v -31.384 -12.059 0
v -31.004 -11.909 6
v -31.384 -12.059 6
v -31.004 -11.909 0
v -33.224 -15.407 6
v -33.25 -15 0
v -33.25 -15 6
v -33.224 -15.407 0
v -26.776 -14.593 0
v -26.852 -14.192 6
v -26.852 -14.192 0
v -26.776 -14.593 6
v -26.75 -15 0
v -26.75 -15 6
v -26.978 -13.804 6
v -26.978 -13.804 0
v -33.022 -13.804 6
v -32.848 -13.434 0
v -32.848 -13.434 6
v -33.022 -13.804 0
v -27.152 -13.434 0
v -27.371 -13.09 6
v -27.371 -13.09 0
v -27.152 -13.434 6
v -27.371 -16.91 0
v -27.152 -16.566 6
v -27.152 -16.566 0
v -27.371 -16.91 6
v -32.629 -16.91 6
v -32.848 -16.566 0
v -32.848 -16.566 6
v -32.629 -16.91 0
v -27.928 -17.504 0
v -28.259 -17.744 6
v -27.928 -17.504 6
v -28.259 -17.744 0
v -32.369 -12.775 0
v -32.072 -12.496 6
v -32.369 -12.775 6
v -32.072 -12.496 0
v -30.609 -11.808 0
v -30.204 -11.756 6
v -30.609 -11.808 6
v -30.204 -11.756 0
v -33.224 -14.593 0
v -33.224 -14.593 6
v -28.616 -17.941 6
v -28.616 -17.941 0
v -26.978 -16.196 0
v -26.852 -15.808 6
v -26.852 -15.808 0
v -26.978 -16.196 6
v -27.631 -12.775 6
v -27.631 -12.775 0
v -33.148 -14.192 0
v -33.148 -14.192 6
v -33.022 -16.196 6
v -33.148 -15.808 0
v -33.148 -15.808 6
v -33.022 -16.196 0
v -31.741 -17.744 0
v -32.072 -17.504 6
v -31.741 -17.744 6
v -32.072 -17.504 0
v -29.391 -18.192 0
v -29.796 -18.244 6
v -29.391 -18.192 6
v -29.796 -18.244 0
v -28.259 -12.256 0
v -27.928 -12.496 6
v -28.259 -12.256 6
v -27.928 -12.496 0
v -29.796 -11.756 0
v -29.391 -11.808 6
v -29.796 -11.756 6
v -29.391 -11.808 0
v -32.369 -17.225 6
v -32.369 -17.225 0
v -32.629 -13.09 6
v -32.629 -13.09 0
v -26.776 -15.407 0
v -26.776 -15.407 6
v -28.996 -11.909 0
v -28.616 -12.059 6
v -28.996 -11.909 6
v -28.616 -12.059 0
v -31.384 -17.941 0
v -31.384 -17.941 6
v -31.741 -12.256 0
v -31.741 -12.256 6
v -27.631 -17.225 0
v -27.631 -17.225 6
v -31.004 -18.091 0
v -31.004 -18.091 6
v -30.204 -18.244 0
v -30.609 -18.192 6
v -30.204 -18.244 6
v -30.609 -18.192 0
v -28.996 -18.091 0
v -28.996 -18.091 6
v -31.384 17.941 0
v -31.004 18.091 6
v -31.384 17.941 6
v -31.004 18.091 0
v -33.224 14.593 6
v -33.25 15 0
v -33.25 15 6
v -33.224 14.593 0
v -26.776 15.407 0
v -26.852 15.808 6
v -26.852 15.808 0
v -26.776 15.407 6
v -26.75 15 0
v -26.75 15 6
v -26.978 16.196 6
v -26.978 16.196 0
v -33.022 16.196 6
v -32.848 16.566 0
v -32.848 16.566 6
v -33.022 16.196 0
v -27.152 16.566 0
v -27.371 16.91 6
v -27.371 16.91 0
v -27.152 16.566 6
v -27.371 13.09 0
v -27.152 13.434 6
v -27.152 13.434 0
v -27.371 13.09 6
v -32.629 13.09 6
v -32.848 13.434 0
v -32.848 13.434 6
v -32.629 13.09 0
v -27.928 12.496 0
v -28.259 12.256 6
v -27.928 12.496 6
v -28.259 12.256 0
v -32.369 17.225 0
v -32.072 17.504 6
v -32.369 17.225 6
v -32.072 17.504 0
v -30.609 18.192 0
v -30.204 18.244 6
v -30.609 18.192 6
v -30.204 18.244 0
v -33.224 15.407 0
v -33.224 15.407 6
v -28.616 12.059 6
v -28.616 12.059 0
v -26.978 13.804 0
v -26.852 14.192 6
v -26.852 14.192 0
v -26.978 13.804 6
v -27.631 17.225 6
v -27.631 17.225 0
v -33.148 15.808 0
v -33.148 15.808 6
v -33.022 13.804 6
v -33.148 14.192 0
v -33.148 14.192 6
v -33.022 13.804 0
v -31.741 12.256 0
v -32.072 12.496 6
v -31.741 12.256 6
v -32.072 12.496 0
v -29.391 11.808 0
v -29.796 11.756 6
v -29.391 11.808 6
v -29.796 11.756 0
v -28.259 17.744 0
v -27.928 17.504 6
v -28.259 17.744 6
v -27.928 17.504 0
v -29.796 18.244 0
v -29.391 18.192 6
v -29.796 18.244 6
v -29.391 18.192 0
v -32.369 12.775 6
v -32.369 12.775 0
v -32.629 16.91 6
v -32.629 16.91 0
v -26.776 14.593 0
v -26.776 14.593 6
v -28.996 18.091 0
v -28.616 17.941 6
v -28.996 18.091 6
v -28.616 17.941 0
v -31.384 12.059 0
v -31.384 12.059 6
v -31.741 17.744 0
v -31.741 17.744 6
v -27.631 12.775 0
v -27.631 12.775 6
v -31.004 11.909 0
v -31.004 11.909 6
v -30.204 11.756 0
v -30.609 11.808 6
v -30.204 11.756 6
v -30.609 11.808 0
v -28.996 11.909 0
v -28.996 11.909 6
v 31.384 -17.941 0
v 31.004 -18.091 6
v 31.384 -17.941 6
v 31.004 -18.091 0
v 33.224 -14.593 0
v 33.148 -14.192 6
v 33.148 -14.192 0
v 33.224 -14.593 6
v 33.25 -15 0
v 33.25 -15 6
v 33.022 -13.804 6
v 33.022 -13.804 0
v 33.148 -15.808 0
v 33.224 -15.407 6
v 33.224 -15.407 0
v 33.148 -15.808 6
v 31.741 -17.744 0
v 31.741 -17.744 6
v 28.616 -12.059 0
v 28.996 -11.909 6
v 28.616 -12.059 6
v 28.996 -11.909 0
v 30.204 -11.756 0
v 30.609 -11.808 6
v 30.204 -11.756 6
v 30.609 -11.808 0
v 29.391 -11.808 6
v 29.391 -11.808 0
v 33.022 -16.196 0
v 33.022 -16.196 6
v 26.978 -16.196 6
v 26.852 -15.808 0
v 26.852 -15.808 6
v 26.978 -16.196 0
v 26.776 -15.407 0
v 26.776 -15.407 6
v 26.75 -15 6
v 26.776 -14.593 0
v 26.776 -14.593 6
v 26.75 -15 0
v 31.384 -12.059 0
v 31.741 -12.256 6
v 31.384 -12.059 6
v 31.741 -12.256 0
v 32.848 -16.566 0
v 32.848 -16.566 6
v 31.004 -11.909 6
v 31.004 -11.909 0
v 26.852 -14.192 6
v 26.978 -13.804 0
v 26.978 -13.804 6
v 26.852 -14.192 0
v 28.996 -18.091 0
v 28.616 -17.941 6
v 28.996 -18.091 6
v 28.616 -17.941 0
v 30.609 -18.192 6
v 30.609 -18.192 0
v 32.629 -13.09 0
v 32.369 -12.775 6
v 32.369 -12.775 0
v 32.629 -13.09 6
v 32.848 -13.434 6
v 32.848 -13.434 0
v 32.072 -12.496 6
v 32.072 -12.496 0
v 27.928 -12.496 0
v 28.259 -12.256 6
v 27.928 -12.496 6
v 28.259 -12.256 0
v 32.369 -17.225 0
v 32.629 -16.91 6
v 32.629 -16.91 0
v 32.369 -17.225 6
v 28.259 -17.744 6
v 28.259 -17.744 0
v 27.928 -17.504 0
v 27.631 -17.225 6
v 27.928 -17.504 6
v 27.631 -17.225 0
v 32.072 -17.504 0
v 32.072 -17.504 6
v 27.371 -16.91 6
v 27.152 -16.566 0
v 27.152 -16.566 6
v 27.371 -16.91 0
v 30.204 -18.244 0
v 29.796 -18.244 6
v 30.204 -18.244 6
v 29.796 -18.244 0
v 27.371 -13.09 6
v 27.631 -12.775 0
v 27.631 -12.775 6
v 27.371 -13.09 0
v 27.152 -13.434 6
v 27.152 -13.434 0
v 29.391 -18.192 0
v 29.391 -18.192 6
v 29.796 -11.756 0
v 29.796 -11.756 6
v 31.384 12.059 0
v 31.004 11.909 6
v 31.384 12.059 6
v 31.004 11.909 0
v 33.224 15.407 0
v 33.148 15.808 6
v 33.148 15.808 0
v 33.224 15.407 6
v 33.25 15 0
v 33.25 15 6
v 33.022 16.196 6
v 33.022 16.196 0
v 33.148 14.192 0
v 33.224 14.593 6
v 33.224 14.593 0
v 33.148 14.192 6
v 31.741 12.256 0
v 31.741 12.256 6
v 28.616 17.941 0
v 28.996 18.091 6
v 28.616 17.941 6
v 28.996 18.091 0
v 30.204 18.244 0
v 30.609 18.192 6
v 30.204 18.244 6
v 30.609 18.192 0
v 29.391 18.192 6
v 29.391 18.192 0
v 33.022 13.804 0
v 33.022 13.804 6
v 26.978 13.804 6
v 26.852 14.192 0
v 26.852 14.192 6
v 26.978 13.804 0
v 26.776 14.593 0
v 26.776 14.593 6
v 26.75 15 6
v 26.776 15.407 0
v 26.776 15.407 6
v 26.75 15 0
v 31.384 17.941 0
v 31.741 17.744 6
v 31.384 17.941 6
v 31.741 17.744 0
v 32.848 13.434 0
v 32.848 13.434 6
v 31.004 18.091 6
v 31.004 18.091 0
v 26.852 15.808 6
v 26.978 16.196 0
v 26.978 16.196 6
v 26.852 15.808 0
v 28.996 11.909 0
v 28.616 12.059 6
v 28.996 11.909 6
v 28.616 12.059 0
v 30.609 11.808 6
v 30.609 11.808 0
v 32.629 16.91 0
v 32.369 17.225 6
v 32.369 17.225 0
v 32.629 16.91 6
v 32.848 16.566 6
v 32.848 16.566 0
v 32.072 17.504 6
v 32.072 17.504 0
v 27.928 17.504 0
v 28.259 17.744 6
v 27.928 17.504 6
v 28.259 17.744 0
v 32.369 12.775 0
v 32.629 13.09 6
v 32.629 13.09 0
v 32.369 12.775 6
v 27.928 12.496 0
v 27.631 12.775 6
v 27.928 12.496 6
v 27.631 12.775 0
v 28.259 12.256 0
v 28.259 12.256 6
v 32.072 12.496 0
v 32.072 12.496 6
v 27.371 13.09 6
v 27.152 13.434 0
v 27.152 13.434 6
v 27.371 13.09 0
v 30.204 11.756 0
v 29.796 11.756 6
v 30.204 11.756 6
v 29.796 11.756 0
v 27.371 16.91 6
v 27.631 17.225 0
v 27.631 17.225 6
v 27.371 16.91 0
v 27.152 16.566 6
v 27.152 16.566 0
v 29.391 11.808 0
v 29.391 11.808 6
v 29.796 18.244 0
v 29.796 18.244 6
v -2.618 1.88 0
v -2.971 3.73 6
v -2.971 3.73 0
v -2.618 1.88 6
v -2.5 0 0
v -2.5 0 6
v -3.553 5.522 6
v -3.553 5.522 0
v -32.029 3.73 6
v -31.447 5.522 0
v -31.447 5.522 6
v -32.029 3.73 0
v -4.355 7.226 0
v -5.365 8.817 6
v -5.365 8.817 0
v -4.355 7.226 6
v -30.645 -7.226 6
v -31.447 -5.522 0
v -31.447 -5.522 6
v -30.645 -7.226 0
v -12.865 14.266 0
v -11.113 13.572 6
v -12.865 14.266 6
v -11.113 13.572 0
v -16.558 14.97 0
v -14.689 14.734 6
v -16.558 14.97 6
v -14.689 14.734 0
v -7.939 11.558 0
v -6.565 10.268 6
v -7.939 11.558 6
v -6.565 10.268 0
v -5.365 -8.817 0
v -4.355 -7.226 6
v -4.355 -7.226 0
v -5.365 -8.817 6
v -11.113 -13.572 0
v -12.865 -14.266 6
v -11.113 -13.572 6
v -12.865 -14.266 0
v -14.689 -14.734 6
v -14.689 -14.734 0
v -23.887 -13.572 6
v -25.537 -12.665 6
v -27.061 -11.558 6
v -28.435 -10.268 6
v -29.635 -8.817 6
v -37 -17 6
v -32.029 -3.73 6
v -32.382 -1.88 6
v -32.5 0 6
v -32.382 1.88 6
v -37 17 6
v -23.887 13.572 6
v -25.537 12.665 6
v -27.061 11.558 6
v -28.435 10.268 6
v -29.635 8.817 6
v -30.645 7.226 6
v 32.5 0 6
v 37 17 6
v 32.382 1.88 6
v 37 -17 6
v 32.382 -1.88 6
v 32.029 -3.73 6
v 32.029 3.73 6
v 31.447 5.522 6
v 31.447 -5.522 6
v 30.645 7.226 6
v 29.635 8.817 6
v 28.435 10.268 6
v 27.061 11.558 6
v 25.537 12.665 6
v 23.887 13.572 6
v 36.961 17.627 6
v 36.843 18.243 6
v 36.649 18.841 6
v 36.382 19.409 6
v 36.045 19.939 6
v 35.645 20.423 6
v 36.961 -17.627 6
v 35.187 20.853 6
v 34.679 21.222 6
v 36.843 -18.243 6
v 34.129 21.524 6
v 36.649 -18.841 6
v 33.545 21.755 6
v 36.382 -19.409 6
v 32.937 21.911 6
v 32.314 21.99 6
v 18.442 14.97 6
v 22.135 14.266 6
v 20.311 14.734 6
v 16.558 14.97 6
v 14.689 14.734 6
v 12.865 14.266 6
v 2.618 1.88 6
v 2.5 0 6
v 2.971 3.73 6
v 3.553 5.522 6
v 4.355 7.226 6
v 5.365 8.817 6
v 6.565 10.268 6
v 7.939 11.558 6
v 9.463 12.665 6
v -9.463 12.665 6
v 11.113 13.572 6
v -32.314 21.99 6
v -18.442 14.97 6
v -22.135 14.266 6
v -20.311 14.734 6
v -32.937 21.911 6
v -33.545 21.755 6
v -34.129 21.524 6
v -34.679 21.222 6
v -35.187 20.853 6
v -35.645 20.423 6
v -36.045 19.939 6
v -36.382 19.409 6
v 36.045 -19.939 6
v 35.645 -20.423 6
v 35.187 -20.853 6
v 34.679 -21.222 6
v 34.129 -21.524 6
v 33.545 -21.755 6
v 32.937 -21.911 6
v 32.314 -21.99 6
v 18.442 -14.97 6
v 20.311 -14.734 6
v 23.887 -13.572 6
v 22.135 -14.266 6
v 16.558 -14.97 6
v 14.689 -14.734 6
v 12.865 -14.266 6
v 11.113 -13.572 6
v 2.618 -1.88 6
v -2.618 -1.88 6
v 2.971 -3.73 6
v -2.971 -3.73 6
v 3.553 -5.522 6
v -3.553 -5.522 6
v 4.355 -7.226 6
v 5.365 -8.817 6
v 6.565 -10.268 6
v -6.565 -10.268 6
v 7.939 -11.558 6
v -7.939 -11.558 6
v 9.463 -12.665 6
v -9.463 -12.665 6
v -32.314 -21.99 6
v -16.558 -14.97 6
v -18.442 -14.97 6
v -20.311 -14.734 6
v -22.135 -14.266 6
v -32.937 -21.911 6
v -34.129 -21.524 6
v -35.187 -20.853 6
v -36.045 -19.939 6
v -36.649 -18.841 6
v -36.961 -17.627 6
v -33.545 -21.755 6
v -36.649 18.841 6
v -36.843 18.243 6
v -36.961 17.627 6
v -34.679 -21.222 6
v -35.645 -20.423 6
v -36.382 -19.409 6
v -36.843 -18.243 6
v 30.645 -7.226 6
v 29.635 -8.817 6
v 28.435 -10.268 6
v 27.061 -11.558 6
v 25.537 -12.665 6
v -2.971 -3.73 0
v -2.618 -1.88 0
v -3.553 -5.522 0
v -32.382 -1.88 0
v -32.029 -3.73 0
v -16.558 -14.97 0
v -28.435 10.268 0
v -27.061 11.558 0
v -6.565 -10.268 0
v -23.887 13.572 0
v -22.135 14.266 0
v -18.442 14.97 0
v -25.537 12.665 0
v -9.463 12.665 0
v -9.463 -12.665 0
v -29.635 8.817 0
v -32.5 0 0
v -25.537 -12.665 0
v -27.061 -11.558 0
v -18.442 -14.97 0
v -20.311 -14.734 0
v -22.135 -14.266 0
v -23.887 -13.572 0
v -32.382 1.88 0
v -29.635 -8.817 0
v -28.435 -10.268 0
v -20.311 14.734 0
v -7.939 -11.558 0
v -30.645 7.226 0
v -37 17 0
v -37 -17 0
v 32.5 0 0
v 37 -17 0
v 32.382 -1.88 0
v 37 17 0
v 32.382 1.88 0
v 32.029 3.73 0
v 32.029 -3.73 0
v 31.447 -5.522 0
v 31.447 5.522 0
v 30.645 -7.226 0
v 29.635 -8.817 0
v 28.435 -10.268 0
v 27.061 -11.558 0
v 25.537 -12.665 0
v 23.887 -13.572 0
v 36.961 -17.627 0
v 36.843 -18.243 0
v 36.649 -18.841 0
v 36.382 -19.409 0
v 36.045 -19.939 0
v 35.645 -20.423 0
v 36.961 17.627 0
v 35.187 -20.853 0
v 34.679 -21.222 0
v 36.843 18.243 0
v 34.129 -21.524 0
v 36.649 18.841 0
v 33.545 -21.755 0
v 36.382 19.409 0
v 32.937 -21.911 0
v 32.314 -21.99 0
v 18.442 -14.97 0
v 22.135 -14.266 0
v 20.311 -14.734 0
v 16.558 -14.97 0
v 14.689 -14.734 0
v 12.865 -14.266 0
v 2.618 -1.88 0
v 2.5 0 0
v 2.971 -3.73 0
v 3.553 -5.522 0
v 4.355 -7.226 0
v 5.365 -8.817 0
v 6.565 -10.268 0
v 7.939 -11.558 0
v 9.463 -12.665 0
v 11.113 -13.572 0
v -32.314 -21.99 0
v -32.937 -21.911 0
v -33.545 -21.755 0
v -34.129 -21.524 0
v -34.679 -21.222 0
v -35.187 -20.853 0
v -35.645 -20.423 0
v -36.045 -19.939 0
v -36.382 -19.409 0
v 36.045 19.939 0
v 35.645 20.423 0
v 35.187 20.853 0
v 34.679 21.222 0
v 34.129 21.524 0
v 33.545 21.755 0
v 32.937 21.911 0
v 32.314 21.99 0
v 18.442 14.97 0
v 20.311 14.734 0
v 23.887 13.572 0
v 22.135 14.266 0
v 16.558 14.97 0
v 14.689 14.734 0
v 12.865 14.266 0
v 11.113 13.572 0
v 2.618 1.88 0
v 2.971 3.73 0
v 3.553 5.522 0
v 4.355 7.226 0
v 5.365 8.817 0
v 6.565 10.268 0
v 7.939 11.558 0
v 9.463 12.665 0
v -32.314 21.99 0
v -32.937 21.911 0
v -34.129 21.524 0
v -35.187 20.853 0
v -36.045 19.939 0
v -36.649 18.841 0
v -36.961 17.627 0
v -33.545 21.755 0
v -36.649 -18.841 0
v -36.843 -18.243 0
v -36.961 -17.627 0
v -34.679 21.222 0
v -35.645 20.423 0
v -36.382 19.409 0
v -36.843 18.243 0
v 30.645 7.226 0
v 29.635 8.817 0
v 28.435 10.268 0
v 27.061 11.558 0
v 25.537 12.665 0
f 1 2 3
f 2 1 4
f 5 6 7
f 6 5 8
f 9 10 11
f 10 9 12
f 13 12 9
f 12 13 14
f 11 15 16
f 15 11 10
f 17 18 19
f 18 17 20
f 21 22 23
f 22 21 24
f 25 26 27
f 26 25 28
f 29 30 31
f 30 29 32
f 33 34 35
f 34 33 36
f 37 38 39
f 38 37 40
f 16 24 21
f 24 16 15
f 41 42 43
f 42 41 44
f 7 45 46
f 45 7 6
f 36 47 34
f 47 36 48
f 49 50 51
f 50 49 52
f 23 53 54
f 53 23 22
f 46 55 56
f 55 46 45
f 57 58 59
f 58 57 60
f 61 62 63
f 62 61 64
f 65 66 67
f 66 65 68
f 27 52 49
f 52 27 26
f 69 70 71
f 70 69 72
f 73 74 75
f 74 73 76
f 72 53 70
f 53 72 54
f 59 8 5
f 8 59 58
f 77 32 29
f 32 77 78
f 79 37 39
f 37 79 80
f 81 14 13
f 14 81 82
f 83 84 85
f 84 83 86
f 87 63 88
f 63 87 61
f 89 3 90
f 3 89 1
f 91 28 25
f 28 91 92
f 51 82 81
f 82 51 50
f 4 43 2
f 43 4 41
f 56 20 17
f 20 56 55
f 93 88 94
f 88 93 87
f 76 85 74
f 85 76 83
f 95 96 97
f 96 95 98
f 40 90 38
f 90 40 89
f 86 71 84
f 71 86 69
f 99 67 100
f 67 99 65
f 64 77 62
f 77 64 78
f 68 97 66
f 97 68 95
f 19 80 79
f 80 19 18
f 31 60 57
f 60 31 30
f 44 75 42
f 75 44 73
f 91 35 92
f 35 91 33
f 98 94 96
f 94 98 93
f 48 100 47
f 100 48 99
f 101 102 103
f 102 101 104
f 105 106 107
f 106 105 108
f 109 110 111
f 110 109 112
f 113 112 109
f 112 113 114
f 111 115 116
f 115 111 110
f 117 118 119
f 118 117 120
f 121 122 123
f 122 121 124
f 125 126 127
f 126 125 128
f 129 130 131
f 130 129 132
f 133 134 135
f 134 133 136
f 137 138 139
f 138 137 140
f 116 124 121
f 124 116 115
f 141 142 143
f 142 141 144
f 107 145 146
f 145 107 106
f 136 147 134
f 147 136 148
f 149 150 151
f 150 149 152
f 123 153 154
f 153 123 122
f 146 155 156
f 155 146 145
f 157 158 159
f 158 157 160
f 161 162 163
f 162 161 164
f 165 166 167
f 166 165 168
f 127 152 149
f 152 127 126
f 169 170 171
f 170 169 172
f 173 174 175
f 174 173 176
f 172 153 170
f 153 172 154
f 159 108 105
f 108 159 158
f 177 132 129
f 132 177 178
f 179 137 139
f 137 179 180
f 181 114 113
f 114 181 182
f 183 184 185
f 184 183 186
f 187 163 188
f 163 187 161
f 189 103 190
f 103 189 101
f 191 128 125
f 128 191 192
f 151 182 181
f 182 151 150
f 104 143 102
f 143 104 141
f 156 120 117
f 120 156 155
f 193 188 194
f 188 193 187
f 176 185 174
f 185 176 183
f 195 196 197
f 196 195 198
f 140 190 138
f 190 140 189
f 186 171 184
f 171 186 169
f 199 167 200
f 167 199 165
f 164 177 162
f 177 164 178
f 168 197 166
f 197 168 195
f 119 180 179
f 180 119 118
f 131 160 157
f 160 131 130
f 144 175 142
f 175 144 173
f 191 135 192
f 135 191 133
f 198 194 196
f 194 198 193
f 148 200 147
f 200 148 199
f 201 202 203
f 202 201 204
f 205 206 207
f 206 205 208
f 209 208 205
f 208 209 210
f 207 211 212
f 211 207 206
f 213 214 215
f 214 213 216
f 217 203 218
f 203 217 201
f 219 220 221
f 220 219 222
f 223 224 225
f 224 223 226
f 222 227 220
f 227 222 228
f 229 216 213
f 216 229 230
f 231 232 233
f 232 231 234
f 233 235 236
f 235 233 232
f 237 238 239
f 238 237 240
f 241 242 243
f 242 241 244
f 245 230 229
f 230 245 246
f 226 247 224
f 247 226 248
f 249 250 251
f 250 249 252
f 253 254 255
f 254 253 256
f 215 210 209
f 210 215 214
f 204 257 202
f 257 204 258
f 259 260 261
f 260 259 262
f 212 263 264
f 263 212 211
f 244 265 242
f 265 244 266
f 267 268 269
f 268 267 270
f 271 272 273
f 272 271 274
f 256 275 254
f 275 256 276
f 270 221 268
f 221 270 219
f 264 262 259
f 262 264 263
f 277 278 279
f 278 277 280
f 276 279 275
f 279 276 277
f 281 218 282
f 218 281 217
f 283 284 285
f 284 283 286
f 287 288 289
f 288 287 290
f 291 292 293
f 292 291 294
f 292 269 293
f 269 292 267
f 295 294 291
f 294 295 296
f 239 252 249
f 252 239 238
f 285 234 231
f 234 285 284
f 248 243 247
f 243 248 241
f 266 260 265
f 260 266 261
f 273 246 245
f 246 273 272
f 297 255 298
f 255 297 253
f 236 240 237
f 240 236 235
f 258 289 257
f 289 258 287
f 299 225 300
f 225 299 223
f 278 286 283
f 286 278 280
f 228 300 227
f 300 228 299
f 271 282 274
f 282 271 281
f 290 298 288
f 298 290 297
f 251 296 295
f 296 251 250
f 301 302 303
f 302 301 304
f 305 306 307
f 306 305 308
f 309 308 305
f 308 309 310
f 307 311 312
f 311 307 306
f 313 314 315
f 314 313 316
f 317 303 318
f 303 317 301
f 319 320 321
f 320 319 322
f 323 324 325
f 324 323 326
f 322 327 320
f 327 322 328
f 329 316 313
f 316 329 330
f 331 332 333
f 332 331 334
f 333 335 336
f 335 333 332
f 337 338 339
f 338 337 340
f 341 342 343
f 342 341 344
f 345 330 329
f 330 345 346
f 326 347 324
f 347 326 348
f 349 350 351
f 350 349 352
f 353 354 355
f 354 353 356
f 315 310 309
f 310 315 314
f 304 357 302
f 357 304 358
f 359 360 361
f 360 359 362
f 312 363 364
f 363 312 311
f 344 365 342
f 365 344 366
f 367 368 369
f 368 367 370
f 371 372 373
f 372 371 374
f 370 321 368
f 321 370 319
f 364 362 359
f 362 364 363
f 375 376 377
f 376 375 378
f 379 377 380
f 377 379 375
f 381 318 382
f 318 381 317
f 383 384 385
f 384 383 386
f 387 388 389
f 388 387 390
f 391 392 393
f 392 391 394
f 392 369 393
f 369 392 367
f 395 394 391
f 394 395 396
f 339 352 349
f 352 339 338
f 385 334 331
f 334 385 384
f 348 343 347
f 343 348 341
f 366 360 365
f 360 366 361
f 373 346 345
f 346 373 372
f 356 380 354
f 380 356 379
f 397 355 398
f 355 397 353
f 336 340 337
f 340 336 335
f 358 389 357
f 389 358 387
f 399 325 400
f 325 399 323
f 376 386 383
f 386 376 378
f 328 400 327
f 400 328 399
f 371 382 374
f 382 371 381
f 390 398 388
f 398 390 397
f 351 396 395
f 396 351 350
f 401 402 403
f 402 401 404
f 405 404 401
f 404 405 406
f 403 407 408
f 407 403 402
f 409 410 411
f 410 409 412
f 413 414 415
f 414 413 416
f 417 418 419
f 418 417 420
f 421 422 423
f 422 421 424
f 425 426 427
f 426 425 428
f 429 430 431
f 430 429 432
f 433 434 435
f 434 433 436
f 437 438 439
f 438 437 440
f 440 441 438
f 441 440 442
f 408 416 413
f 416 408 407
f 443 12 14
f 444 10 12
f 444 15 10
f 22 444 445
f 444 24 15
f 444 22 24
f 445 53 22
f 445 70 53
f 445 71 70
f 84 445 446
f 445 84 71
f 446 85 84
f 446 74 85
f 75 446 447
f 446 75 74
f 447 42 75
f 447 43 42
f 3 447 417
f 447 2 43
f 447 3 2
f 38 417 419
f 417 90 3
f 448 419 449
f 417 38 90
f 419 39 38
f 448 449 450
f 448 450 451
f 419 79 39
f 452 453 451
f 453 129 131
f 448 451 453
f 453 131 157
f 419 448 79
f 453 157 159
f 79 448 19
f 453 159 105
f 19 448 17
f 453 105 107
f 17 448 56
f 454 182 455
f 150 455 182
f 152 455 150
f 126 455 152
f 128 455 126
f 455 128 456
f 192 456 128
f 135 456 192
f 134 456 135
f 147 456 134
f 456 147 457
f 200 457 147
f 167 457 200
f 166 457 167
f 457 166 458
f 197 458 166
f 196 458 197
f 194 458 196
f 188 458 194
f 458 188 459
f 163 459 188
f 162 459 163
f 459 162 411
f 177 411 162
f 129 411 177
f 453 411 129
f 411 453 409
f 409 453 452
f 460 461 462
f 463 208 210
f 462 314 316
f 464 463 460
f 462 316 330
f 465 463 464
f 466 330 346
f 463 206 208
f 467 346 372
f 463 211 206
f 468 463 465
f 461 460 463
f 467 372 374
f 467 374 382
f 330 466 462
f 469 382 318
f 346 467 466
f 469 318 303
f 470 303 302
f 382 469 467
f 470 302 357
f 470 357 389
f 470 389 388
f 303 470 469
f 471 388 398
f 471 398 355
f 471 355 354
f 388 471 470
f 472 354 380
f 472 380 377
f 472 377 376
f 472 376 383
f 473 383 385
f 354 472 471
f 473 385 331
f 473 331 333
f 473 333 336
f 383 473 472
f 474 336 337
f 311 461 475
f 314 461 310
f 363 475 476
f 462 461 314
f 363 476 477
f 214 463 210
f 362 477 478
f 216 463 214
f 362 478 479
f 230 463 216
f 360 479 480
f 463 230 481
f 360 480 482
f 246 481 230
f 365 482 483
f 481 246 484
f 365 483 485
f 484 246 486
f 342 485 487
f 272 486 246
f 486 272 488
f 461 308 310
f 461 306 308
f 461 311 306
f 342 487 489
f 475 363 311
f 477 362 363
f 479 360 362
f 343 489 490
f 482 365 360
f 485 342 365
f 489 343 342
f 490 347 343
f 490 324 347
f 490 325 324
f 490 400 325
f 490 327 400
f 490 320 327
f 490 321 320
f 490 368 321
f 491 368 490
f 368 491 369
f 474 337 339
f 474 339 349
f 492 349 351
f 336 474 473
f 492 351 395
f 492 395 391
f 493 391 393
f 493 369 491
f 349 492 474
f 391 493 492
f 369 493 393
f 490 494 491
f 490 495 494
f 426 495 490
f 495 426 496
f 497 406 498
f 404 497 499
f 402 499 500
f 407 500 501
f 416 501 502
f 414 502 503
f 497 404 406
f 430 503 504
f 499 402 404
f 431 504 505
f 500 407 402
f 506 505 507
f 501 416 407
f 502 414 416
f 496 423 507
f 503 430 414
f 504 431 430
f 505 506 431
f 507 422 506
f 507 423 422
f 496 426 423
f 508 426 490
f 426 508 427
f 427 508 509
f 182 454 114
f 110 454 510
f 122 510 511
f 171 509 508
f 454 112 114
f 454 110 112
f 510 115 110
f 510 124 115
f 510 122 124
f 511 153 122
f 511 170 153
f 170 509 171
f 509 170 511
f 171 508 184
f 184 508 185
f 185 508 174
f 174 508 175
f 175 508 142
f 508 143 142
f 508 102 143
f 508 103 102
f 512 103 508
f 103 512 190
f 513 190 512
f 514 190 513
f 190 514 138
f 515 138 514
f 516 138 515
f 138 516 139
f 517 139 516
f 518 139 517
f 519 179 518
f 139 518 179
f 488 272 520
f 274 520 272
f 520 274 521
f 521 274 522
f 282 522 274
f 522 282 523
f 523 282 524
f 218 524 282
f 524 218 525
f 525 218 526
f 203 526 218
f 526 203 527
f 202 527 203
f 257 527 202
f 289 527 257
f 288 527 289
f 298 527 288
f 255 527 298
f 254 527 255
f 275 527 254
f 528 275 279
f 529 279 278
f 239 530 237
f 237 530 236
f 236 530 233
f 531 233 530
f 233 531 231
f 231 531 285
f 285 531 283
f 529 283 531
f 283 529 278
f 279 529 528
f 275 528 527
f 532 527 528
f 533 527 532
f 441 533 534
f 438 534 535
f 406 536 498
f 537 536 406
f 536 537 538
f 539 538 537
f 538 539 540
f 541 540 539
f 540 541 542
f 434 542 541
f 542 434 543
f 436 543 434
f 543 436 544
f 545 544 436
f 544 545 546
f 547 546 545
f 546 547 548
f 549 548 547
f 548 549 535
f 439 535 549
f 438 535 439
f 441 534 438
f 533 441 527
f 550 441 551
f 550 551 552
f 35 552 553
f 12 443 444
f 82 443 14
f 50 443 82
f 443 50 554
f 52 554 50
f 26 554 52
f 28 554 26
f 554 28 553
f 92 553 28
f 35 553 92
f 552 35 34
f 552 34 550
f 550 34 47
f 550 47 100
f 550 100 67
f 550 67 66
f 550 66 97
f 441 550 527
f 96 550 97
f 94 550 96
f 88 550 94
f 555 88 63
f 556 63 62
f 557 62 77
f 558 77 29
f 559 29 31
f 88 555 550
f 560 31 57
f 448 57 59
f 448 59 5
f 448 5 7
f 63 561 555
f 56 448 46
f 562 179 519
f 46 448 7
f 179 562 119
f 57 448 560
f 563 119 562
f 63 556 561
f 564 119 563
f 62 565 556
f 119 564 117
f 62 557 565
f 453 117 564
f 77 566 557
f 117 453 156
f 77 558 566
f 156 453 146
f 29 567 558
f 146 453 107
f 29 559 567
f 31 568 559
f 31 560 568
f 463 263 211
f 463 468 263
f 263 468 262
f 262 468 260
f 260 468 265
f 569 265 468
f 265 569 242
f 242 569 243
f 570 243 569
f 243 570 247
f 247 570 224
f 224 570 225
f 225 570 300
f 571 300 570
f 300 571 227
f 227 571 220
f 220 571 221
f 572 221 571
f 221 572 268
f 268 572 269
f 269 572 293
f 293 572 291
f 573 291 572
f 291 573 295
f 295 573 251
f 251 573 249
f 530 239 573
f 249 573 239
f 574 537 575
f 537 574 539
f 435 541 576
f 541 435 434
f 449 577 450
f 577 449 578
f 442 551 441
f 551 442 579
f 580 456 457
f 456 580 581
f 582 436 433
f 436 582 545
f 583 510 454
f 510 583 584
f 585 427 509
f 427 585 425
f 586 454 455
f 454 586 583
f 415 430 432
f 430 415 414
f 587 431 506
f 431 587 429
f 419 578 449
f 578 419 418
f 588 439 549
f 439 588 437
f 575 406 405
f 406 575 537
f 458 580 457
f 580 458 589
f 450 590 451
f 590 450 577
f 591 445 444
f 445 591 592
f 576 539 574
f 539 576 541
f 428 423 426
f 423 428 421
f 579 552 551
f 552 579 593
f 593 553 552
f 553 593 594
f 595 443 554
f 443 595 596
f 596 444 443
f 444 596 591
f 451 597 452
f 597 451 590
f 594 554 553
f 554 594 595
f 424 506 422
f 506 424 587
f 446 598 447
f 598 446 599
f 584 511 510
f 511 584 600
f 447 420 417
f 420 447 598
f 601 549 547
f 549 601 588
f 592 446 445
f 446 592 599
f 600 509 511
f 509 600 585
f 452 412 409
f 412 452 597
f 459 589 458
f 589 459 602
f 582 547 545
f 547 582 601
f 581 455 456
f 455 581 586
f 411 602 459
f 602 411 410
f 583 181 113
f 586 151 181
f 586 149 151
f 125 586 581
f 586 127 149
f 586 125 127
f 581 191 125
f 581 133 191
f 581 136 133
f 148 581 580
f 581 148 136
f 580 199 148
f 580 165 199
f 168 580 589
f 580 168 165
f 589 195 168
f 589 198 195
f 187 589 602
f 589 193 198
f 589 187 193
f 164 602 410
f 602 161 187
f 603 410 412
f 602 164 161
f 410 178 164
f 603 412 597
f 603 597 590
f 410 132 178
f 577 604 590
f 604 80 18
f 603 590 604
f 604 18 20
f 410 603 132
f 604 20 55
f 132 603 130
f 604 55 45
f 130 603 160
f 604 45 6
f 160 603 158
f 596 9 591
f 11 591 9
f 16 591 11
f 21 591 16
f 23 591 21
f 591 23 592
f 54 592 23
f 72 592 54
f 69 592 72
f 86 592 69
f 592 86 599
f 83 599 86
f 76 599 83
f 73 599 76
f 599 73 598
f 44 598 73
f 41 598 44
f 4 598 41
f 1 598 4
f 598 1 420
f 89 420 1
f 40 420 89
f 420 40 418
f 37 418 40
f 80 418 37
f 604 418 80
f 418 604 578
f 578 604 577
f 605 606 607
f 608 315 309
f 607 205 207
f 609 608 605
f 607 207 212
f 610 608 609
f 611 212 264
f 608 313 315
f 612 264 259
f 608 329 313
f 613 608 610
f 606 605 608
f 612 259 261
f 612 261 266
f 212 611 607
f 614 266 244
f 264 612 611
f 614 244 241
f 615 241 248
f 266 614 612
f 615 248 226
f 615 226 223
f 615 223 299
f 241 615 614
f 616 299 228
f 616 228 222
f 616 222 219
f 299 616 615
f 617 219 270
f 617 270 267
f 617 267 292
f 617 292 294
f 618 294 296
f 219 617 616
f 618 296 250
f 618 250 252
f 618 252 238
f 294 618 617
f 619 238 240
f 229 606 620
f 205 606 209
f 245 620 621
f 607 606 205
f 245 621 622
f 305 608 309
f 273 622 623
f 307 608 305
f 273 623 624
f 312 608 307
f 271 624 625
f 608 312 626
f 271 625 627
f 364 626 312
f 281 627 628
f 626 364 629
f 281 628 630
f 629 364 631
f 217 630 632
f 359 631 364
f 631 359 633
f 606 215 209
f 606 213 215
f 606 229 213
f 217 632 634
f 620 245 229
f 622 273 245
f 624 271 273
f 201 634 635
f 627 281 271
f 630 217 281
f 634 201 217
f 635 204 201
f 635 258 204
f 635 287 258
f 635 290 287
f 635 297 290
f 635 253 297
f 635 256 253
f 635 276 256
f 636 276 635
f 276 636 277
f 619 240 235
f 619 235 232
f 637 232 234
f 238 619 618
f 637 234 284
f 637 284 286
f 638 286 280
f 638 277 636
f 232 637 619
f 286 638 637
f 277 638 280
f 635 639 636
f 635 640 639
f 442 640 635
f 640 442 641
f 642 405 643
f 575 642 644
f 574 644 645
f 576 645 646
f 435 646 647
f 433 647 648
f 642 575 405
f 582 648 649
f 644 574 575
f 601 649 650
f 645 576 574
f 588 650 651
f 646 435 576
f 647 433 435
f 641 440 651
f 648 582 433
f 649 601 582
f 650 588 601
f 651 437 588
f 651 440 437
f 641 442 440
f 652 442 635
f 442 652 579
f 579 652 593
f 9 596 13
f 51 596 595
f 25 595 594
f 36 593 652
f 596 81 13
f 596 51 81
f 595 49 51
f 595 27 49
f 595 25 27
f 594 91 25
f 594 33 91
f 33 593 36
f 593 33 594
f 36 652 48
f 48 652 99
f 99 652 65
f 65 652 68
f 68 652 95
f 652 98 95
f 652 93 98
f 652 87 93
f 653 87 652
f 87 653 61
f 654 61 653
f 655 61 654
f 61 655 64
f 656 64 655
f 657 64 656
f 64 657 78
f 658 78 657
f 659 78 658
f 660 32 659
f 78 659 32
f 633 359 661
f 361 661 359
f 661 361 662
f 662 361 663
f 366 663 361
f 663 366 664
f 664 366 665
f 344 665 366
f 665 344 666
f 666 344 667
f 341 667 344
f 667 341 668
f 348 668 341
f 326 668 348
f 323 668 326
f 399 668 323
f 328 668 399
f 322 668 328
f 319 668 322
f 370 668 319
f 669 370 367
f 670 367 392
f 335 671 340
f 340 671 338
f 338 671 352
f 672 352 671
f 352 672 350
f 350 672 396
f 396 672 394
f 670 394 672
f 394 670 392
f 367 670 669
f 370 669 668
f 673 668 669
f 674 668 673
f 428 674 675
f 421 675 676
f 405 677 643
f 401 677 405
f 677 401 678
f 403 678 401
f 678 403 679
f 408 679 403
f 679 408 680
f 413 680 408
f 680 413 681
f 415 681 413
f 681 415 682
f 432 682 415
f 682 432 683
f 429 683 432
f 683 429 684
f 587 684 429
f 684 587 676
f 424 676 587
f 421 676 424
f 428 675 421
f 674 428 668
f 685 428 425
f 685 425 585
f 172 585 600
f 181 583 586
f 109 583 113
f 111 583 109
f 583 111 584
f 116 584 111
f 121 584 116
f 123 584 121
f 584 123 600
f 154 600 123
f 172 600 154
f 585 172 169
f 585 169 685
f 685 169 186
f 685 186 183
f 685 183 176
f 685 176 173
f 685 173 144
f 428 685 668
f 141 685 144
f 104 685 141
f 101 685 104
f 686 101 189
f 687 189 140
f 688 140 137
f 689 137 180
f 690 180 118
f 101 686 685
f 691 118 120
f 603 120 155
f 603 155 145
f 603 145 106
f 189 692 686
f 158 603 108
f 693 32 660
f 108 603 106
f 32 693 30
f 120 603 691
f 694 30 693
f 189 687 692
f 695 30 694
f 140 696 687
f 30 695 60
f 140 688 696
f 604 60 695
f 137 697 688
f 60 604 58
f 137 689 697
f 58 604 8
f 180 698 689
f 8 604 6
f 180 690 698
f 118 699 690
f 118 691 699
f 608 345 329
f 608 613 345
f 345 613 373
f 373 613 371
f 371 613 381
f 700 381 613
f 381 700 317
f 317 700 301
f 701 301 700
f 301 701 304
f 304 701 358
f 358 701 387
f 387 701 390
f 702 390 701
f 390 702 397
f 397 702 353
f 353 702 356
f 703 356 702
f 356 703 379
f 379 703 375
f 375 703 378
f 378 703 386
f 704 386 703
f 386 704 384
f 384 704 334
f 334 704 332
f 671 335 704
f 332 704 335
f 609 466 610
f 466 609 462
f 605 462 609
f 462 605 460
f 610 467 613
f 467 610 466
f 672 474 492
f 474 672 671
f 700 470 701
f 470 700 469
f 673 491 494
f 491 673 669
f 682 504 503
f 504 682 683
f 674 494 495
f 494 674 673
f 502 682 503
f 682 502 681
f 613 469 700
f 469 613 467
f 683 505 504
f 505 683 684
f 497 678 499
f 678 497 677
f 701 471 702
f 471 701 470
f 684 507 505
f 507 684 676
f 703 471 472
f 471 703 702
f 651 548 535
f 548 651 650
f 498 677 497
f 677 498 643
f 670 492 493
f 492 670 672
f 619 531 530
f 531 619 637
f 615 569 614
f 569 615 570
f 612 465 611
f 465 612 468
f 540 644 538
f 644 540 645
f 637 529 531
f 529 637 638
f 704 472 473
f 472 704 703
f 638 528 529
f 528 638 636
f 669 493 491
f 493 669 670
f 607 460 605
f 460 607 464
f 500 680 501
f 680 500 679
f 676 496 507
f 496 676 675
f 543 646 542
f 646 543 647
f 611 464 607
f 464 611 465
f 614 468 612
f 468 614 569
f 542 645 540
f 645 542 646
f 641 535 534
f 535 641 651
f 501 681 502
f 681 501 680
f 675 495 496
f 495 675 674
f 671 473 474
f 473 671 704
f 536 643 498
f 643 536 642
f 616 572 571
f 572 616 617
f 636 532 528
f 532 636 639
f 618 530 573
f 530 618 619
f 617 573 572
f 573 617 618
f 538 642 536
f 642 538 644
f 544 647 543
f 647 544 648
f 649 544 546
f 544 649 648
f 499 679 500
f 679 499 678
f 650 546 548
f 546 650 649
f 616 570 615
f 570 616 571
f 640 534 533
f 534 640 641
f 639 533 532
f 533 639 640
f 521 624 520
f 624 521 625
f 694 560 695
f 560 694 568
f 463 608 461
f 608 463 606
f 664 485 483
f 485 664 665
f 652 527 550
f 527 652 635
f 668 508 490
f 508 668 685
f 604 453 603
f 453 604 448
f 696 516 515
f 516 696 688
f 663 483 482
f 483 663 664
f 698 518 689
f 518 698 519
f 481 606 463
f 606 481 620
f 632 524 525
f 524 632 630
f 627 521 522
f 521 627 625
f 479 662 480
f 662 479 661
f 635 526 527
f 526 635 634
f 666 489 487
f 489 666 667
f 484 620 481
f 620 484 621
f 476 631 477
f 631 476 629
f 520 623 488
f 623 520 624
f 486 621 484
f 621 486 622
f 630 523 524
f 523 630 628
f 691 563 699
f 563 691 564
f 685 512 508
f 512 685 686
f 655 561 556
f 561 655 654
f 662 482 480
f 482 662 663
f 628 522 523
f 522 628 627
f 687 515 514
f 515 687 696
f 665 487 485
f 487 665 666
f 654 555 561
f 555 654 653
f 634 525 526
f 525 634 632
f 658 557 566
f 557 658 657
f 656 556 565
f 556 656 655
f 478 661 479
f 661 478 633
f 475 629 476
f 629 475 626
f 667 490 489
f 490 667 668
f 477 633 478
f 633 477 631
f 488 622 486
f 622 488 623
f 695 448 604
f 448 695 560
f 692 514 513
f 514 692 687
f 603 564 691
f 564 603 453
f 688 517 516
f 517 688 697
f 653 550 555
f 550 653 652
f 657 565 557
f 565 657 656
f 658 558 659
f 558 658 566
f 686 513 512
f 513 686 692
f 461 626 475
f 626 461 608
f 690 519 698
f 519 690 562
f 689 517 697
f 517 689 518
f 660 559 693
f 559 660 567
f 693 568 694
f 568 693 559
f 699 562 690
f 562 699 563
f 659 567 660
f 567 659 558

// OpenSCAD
$fn = 50;

difference() {
	union() {
		hull() {
			translate(v = [-32.0, 17.0, 0]) {
				cylinder(h = 6, r = 5);
			}
			translate(v = [32.0, 17.0, 0]) {
				cylinder(h = 6, r = 5);
			}
			translate(v = [-32.0, -17.0, 0]) {
				cylinder(h = 6, r = 5);
			}
			translate(v = [32.0, -17.0, 0]) {
				cylinder(h = 6, r = 5);
			}
		}
	}
	union() {
		translate(v = [-30.0, -15.0, -100.0]) {
			cylinder(h = 200, r = 3.25);
		}
		translate(v = [-30.0, 15.0, -100.0]) {
			cylinder(h = 200, r = 3.25);
		}
		translate(v = [30.0, -15.0, -100.0]) {
			cylinder(h = 200, r = 3.25);
		}
		translate(v = [30.0, 15.0, -100.0]) {
			cylinder(h = 200, r = 3.25);
		}
		translate(v = [-30.0, -15.0, -100.0]) {
			cylinder(h = 200, r = 1.8);
		}
		translate(v = [-30.0, 15.0, -100.0]) {
			cylinder(h = 200, r = 1.8);
		}
		translate(v = [30.0, -15.0, -100.0]) {
			cylinder(h = 200, r = 1.8);
		}
		translate(v = [30.0, 15.0, -100.0]) {
			cylinder(h = 200, r = 1.8);
		}
		translate(v = [-17.5, 0, 0.0]) {
			cylinder(h = 6, r = 15.0);
		}
		translate(v = [17.5, 0, 0.0]) {
			cylinder(h = 6, r = 15.0);
		}
	}
}
